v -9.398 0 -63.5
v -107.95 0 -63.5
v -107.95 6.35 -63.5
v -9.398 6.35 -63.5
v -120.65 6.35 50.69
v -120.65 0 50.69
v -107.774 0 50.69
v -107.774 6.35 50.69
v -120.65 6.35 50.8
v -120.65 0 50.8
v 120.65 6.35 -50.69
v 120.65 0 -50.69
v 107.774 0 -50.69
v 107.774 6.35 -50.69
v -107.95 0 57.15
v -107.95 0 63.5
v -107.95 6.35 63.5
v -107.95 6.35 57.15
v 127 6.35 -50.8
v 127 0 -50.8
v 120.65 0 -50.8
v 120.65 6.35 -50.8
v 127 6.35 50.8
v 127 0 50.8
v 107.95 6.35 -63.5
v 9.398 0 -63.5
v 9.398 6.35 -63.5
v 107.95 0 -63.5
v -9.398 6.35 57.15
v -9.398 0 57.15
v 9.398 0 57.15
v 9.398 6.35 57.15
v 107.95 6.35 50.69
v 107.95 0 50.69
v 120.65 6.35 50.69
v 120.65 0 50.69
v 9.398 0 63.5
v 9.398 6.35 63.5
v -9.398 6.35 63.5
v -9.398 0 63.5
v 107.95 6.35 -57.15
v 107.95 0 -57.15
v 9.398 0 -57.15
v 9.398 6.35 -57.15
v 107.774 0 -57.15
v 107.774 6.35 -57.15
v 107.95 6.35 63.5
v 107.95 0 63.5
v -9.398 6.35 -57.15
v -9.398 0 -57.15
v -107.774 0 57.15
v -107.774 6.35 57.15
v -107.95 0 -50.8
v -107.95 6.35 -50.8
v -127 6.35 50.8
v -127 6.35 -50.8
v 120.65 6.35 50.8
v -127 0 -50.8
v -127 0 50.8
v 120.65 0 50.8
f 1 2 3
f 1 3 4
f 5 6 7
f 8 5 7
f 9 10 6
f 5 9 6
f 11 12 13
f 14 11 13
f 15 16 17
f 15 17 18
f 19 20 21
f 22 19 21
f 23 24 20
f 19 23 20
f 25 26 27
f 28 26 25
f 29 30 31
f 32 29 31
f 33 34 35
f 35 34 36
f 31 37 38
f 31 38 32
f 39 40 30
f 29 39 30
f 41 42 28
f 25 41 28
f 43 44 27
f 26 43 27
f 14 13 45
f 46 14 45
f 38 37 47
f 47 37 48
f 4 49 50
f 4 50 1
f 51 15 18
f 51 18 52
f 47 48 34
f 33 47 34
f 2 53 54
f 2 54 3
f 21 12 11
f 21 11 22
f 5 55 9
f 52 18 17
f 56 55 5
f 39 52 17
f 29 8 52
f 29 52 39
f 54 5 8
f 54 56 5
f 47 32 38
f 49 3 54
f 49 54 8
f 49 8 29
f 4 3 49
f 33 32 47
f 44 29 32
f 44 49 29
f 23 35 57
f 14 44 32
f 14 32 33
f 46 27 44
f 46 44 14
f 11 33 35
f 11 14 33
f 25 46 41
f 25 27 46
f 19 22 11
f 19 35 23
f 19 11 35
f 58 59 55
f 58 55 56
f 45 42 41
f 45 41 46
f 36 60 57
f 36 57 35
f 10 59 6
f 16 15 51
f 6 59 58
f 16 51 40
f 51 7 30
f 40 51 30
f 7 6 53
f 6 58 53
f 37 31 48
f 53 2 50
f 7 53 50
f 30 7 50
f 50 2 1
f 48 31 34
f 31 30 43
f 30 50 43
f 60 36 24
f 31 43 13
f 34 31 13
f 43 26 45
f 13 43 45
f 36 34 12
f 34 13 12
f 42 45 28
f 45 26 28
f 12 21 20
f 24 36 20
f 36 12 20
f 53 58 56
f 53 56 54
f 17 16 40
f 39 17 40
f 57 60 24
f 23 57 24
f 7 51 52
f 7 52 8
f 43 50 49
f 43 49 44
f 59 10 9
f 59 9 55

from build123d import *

# Parameters (mm, degrees)
SKETCH1_W               = 254
SKETCH1_H               = 127
BOSS_EXTRUDE1_DEPTH     = 6.35
SKETCH2_W               = 18.796
SKETCH2_H               = 6.35
CUT_EXTRUDE1_DEPTH      = 7.35
CUT_EXTRUDE1_DEPTH_BACK = 6.35
SKETCH3_W               = 12.876244412
SKETCH3_H               = 6.459801397
SKETCH3_W_2             = 12.7
SKETCH3_H_2             = 6.35
CUT_EXTRUDE3_DEPTH      = 127
CUT_EXTRUDE3_DEPTH_BACK = 127
SKETCH4_W               = 12.876244412
SKETCH4_H               = 6.459801397
CUT_EXTRUDE4_DEPTH      = 127
CUT_EXTRUDE4_DEPTH_BACK = 127


with BuildPart() as part:
    # Sketch1 → Boss-Extrude1 (new body)
    with BuildSketch(Plane(origin=(0, 0, 0), x_dir=(1, 0, 0), z_dir=(0, 1, 0))):
        Rectangle(SKETCH1_W, SKETCH1_H)
    extrude(amount=BOSS_EXTRUDE1_DEPTH)

    # Sketch2 → Cut-Extrude1 (cut, two sides)
    with BuildSketch(Plane(origin=(0, 0, 0), x_dir=(1, 0, 0), z_dir=(0, 1, 0))) as cut_extrude1_sk:
        Polygon((-107.95, -63.5), (-107.95, -57.15), (-120.65, -57.15), (-120.65, -50.8), (-127, -50.8), (-127, -63.5), align=None)
        with Locations((0, -60.325)):
            Rectangle(SKETCH2_W, SKETCH2_H)
        Polygon((-127, 50.8), (-120.65, 50.8), (-120.65, 57.15), (-107.95, 57.15), (-107.95, 63.5), (-127, 63.5), align=None)
        with Locations((0, 60.325)):
            Rectangle(SKETCH2_W, SKETCH2_H)
        Polygon((107.95, -63.5), (107.95, -57.15), (120.65, -57.15), (120.65, -50.8), (127, -50.8), (127, -63.5), align=None)
        Polygon((127, 50.8), (120.65, 50.8), (120.65, 57.15), (107.95, 57.15), (107.95, 63.5), (127, 63.5), align=None)
    extrude(amount=CUT_EXTRUDE1_DEPTH, mode=Mode.SUBTRACT)
    extrude(cut_extrude1_sk.sketch, amount=-CUT_EXTRUDE1_DEPTH_BACK, mode=Mode.SUBTRACT)

    # Sketch3 → Cut-Extrude3 (cut, two sides)
    with BuildSketch(Plane(origin=(0, 0, 0), x_dir=(1, 0, 0), z_dir=(0, 1, 0))) as cut_extrude3_sk:
        with Locations((-114.211877794, -53.920099302)):
            Rectangle(SKETCH3_W, SKETCH3_H)
        with Locations((-114.3, 53.975)):
            Rectangle(SKETCH3_W_2, SKETCH3_H_2)
        with Locations((114.3, -53.920099302)):
            Rectangle(SKETCH3_W_2, SKETCH3_H)
    extrude(amount=CUT_EXTRUDE3_DEPTH, mode=Mode.SUBTRACT)
    extrude(cut_extrude3_sk.sketch, amount=-CUT_EXTRUDE3_DEPTH_BACK, mode=Mode.SUBTRACT)

    # Sketch4 → Cut-Extrude4 (cut, two sides)
    with BuildSketch(Plane(origin=(0, 0, 0), x_dir=(-1, 0, 0), z_dir=(0, -1, 0))) as cut_extrude4_sk:
        with Locations((-114.211877794, 53.920099302)):
            Rectangle(SKETCH4_W, SKETCH4_H)
    extrude(amount=CUT_EXTRUDE4_DEPTH, mode=Mode.SUBTRACT)
    extrude(cut_extrude4_sk.sketch, amount=-CUT_EXTRUDE4_DEPTH_BACK, mode=Mode.SUBTRACT)


solid = part.part
